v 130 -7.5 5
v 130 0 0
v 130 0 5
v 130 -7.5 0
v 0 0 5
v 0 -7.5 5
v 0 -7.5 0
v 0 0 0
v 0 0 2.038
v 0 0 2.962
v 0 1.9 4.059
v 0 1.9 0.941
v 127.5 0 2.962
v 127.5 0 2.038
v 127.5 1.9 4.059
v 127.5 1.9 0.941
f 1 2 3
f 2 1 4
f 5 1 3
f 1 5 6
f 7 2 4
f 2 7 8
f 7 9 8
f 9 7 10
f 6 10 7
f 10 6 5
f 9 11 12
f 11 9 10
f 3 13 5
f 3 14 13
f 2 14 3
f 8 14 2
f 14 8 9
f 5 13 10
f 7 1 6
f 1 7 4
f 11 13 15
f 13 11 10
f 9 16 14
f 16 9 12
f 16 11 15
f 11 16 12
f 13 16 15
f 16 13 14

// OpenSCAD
$fn=96;

//use <cube/cube.scad>
max_height = 159;
max_depth = 380;
dovetail_rad = 9.7;
width = 220;
depth = 132.5;
center_depth = max_depth/3+6.85;
side_depth = max_depth/3+6.85/2;
height = 5;

leg_width = 30;
leg_depth = 5;
filet = 20;

module center() {
    difference() {
        union() {
            cube ([ width, center_depth, height ]);
                    
          //legs
            translate ([ 0, 0, height ])
                cube ([ leg_width, leg_depth, max_height-height ]);
            
          translate ([ 0, center_depth-leg_depth, height ])
                cube ([ leg_width, leg_depth, max_height-height ]);
              
          translate ([ width-leg_width, 0, height ])
                cube ([ leg_width, leg_depth, max_height-height ]);
            
            translate ([ width-leg_width, center_depth-leg_depth, height ])
                cube ([ leg_width, leg_depth, max_height-height ]);
            
            //dovetail support
            translate ([ leg_width/2, 0, leg_depth ])
                cube ([ width-leg_width, leg_depth*2, 1 ]);
            translate ([ leg_width/2, center_depth-leg_depth*2, leg_depth ])
                cube ([ width-leg_width, leg_depth*2, 1 ]);
            
            //fillets
          
            translate ([ 1, leg_depth, height ])
                cube ([ leg_width-2, 20, 20 ]);
            translate ([ width-leg_width+1, leg_depth, height ])
                cube ([ leg_width-2, 20, 20 ]);
            translate ([ width-leg_width+1, center_depth-filet-leg_depth, height ])
                cube ([ leg_width-2, 20, 20 ]);
            translate ([ 1, center_depth-filet-leg_depth, height ])
                cube ([ leg_width-2, 20, 20 ]);
            
        }
        //filet smooth
            translate ([ 0, filet+leg_depth, height+filet ])
            rotate([ 0, 90, 0 ])
                cylinder ( h = leg_width, r = 20 );
            translate ([ width-leg_width, filet+leg_depth, height+filet ])
            rotate([ 0, 90, 0 ])
                cylinder ( h = leg_width, r = 20 );
            translate ([ width-leg_width, center_depth-filet-leg_depth, height+filet ])
            rotate([ 0, 90, 0 ])
                cylinder ( h = leg_width, r = 20 );
            translate ([ 0, center_depth-filet-leg_depth, height+filet ])
            rotate([ 0, 90, 0 ])
                cylinder ( h = leg_width, r = 20 );
          //}
        
        //Add the dovetails
        for(i = [ 12.2 : width/9 : 224])
        {
          
          translate ([ i, 2, 0 ])
          color( "blue" )
          rotate ([ 180, 180, 90 ])
            cylinder( h = height, r = dovetail_rad, $fn = 3 );
        }
 
        for(i = [ 12.2 : width/9 : 224 ])
        {
          translate ([ i, center_depth-2, 0 ])
          color( "blue" )
          rotate ([ 0, 0, 90 ])
            cylinder( h = height, r = dovetail_rad, $fn = 3 );
        }     
    }
}

module side() {
    difference() {
        union() {
            //translate([ 0, depth, 0 ])
    
                cube ([ width, side_depth, height ]);
            //legs
            
            translate ([ width-leg_width, side_depth-leg_depth, height ])
                cube ([ leg_width, leg_depth, max_height-height ]);
            translate ([ 0, side_depth-leg_depth, height ])
                cube ([ leg_width, leg_depth, max_height-height ]);
            
            //dovetail support
            //translate ([ leg_width, 0, leg_depth ])
              //  cube ([ width-leg_width*2, leg_depth*1.5, leg_depth ]);
            
            //fillets
          
            //translate ([ 0, leg_depth, height ])
              //  cube ([ leg_width, 20, 20 ]);
            //translate ([ width-leg_width, leg_depth, height ])
              //  cube ([ leg_width, 20, 20 ]);
            translate ([ width-leg_width+1, side_depth-filet-leg_depth, height ])
                cube ([ leg_width-2, 20, 20 ]);
            translate ([ 1, side_depth-filet-leg_depth, height ])
                cube ([ leg_width-2, 20, 20 ]);
            
        }
        //filet smooth
            //translate ([ 0, filet+leg_depth, height+filet ])
            //rotate([ 0, 90, 0 ])
              //  cylinder ( h = leg_width, r = 20 );
            //translate ([ width-leg_width, filet+leg_depth, height+filet ])
            //rotate([ 0, 90, 0 ])
              //  cylinder ( h = leg_width, r = 20 );
            translate ([ width-leg_width, side_depth-filet-leg_depth, height+filet ])
            rotate([ 0, 90, 0 ])
                cylinder ( h = leg_width, r = 20 );
            translate ([ 0, side_depth-filet-leg_depth, height+filet ])
            rotate([ 0, 90, 0 ])
                cylinder ( h = leg_width, r = 20 );
        //Add the dovetails
        for(i = [ 0 : width/9 : 224])
        {
          
          translate ([ i, 2, 0 ])
          color( "blue" )
          rotate ([ 180, 180, 90 ])
            cylinder( h = height, r = dovetail_rad, $fn = 3 );
        }
        
        
      
        
        }
        
    }

module legs() {
  
    difference() {
        union() {
            //translate([ 0, depth, 0 ])
    
                //cube ([ width, side_depth, height ]);
            //legs
            /*
            translate ([ width-leg_width, side_depth-leg_depth, height ])
                cube ([ leg_width, leg_depth, max_height-height ]);
            translate ([ 0, side_depth-leg_depth, height ])
                cube ([ leg_width, leg_depth, max_height-height ]);
            */
            //dovetail support
            //translate ([ leg_width, 0, leg_depth ])
          
                cube ([ width-leg_width*3, leg_depth*1.5, leg_depth ]);
        }
        
        translate([ depth, 1, 2.5 ])
        rotate([ 90, 0, 270 ])
        cylinder( h = depth, r = 2, $fn =3 );
        
    }
  }
  
  module notch_test(){
    union(){
        mirror([0, 1, 0 ])
             cube ([ width-leg_width*3, leg_depth*1.5, leg_depth ]);
          translate([ depth-5, 1, 2.5 ])
        rotate([ 90, 0, 270 ])
        cylinder( h = depth-5, r = 1.8, $fn =3 );
    }
    
  }

notch_test();
//legs();
//center();
/*
translate([ 0, depth-dovetail_rad/2-.5, 0 ])
side();
// */
/*
translate ([ 0, +dovetail_rad/2+1.5, 0 ])
mirror([0,1,0 ])
    side();
// */
